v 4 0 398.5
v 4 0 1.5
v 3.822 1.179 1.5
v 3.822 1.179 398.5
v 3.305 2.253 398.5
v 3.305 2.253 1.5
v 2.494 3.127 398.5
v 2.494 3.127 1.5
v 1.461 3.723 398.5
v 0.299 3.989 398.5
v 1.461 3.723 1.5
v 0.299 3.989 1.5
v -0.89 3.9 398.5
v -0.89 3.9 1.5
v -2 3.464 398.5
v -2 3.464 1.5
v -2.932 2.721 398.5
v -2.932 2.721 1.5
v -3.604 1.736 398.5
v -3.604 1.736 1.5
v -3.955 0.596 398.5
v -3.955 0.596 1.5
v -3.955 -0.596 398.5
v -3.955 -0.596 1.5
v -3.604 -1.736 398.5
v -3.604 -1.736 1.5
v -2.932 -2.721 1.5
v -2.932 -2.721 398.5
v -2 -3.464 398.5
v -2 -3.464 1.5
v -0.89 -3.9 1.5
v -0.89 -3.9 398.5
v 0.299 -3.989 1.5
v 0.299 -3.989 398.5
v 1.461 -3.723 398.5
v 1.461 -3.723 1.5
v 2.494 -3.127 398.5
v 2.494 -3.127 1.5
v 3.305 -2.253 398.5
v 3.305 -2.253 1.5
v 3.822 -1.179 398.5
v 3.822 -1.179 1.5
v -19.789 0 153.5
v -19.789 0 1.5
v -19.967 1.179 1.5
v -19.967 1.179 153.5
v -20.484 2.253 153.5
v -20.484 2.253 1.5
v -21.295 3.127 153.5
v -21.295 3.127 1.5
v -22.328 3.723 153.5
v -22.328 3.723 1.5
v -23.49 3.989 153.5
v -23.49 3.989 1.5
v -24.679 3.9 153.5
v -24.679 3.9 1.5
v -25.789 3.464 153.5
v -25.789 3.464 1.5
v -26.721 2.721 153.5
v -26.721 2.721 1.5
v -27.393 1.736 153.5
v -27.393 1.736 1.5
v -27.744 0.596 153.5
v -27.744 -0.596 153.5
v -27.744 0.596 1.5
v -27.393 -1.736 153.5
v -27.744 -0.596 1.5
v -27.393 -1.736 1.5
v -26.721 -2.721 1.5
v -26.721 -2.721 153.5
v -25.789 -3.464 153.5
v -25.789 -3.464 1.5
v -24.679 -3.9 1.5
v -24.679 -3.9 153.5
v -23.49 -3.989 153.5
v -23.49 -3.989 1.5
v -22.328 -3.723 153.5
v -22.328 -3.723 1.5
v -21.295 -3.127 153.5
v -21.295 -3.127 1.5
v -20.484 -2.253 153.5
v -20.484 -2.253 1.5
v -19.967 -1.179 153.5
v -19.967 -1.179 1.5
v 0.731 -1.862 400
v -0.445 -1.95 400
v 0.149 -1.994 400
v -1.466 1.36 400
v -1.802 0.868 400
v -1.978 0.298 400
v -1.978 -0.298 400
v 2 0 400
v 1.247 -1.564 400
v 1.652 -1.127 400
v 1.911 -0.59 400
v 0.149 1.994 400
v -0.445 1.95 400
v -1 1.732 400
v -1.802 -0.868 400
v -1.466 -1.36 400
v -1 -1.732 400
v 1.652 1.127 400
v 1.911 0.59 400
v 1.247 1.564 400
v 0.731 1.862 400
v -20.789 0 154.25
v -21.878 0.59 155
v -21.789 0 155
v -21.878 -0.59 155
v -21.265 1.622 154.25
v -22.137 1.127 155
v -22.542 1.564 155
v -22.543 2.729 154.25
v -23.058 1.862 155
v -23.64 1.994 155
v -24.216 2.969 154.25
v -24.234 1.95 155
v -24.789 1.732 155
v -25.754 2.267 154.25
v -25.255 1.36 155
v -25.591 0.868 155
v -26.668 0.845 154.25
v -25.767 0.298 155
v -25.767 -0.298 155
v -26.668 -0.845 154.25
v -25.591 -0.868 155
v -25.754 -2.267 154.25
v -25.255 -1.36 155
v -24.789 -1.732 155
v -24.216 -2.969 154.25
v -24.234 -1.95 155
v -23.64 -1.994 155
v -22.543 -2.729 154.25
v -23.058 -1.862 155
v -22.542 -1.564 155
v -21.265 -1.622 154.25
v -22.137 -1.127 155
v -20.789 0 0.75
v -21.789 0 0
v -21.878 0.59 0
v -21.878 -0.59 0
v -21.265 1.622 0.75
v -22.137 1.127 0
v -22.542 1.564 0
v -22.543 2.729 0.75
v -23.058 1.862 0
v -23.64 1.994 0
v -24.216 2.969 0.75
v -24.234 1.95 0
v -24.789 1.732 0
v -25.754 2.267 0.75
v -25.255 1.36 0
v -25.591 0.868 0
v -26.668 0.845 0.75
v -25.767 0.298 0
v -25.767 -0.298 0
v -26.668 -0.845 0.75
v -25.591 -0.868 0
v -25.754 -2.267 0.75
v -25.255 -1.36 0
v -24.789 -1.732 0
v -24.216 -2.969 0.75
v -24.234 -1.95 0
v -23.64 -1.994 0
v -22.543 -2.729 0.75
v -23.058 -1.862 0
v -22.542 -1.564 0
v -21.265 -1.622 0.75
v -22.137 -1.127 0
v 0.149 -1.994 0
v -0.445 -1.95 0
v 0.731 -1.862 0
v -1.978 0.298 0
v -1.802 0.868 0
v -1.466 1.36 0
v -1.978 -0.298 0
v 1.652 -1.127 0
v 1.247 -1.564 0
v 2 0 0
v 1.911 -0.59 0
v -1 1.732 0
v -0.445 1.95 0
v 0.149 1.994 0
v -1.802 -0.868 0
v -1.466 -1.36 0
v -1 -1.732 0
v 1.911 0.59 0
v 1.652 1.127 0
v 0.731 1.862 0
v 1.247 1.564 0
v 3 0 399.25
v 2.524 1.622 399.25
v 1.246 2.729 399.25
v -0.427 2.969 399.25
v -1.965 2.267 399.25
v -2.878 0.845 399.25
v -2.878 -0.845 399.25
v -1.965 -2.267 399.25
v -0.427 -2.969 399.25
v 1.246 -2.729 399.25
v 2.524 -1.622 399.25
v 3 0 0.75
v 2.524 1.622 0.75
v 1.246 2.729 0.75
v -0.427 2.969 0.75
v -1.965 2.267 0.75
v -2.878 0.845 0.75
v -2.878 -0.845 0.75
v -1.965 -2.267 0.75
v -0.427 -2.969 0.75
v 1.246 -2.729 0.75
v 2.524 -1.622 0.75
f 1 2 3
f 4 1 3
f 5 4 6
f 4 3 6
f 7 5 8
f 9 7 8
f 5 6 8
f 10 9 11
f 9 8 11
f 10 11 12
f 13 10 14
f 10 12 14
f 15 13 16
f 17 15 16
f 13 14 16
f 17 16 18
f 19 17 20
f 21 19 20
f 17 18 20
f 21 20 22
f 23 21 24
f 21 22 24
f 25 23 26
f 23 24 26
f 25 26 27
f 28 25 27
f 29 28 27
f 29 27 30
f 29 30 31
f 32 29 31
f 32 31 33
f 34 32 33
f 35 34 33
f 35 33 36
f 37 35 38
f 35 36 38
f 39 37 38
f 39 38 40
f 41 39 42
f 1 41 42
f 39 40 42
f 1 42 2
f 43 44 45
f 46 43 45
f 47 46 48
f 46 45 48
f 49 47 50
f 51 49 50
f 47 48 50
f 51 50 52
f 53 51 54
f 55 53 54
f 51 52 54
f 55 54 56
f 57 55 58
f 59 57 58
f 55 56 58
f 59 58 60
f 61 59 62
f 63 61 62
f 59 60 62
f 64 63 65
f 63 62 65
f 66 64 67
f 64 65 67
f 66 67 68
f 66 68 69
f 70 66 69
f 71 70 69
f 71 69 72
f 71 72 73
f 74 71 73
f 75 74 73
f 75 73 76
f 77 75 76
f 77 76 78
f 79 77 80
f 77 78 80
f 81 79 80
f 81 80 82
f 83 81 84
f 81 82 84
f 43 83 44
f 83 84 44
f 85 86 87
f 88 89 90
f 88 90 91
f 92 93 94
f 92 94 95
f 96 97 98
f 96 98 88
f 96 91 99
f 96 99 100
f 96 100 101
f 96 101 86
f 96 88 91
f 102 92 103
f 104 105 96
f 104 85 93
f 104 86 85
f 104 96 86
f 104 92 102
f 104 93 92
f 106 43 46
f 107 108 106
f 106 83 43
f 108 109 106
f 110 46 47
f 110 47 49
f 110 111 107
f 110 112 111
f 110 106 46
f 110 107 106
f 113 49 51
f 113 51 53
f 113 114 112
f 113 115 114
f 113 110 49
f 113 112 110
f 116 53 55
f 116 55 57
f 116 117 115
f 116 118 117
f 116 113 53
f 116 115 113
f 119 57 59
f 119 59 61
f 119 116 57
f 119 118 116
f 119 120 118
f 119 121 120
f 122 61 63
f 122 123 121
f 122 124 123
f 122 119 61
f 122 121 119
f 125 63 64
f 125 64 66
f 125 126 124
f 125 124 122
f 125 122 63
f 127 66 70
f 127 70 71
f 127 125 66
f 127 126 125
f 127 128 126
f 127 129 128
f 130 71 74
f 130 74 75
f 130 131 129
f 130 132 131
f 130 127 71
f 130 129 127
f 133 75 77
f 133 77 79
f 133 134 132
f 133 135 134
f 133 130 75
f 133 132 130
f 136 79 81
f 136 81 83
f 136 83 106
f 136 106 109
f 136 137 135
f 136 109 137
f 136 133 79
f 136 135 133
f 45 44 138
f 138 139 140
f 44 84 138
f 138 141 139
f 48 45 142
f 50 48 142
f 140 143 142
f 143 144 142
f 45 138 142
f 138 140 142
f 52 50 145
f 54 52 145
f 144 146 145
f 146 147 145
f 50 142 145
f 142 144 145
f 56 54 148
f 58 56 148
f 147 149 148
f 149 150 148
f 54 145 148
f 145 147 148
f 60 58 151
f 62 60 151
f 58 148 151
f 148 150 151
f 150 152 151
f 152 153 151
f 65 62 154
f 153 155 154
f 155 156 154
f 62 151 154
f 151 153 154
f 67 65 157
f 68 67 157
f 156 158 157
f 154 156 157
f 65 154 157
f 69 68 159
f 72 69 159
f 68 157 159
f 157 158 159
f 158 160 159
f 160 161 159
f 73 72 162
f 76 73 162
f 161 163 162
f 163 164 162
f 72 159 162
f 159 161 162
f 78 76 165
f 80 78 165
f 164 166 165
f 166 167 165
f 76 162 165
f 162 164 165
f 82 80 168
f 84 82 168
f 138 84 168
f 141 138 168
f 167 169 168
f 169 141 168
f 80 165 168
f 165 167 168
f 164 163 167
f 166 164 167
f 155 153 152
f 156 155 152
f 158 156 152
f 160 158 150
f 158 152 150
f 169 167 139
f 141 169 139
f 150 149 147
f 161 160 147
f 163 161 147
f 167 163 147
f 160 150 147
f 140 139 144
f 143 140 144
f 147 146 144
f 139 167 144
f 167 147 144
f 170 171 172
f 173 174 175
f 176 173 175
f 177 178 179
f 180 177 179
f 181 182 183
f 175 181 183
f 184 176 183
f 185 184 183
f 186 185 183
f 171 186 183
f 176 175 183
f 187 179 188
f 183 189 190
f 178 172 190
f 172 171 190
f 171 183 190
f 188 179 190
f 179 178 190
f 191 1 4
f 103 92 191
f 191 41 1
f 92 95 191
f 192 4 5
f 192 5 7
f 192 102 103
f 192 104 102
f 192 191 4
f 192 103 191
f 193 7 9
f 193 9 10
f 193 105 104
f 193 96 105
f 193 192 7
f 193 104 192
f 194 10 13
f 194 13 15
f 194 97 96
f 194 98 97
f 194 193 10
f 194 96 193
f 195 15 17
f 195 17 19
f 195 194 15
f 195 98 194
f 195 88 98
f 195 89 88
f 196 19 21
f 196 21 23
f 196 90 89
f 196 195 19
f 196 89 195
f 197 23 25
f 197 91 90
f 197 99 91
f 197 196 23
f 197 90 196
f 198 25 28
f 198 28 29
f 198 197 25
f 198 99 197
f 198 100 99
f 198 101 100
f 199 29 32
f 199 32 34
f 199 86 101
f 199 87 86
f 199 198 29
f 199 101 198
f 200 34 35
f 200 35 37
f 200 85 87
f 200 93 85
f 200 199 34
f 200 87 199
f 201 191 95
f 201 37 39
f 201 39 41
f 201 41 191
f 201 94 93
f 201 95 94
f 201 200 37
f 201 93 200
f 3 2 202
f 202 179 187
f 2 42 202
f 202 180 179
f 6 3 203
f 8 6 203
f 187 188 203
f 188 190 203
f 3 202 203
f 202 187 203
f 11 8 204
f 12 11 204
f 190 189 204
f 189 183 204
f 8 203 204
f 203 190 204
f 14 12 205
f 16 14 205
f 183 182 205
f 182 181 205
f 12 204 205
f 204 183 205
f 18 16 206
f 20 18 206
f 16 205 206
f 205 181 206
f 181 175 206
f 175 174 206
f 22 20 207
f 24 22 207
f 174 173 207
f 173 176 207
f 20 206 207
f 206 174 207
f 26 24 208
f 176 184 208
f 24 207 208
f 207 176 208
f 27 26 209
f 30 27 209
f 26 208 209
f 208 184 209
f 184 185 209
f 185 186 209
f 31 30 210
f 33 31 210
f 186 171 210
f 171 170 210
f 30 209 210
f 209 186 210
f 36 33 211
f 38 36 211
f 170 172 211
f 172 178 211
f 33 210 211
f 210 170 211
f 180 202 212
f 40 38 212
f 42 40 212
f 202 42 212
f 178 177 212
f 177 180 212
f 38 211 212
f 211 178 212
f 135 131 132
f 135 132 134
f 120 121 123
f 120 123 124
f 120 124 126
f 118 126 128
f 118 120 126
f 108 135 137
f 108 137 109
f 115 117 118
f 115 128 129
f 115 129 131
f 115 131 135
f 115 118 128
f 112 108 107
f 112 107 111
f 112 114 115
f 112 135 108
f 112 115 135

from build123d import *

# Parameters (mm, degrees)
F0_R     = 4
F1_DEPTH = 400
F2_SIZE2 = 2
F2_SIZE  = 1.5
F3_DEPTH = 155
F4_SIZE2 = 2
F4_SIZE  = 1.5


with BuildPart() as f1:
    # F0 (on Top) → F1 (new body)
    with BuildSketch(Plane.XY):
        Circle(F0_R)
    extrude(amount=F1_DEPTH)

    # F2
    f2_edges = [f1.edges().sort_by_distance(p)[0] for p in [
        (-4, 0, 0),
        (-4, 0, 400),
    ]]
    chamfer(f2_edges, length=F2_SIZE, length2=F2_SIZE2)


with BuildPart() as f3:
    # F0 (on Top) → F3 (new body)
    with BuildSketch(Plane.XY):
        with Locations((-23.789063, 0)):
            Circle(F0_R)
    extrude(amount=F3_DEPTH)

    # F4
    f4_edges = [f3.edges().sort_by_distance(p)[0] for p in [
        (-27.789063, 0, 155),
        (-27.789063, 0, 0),
    ]]
    chamfer(f4_edges, length=F4_SIZE, length2=F4_SIZE2)


solid = Compound([f1.part, f3.part])
